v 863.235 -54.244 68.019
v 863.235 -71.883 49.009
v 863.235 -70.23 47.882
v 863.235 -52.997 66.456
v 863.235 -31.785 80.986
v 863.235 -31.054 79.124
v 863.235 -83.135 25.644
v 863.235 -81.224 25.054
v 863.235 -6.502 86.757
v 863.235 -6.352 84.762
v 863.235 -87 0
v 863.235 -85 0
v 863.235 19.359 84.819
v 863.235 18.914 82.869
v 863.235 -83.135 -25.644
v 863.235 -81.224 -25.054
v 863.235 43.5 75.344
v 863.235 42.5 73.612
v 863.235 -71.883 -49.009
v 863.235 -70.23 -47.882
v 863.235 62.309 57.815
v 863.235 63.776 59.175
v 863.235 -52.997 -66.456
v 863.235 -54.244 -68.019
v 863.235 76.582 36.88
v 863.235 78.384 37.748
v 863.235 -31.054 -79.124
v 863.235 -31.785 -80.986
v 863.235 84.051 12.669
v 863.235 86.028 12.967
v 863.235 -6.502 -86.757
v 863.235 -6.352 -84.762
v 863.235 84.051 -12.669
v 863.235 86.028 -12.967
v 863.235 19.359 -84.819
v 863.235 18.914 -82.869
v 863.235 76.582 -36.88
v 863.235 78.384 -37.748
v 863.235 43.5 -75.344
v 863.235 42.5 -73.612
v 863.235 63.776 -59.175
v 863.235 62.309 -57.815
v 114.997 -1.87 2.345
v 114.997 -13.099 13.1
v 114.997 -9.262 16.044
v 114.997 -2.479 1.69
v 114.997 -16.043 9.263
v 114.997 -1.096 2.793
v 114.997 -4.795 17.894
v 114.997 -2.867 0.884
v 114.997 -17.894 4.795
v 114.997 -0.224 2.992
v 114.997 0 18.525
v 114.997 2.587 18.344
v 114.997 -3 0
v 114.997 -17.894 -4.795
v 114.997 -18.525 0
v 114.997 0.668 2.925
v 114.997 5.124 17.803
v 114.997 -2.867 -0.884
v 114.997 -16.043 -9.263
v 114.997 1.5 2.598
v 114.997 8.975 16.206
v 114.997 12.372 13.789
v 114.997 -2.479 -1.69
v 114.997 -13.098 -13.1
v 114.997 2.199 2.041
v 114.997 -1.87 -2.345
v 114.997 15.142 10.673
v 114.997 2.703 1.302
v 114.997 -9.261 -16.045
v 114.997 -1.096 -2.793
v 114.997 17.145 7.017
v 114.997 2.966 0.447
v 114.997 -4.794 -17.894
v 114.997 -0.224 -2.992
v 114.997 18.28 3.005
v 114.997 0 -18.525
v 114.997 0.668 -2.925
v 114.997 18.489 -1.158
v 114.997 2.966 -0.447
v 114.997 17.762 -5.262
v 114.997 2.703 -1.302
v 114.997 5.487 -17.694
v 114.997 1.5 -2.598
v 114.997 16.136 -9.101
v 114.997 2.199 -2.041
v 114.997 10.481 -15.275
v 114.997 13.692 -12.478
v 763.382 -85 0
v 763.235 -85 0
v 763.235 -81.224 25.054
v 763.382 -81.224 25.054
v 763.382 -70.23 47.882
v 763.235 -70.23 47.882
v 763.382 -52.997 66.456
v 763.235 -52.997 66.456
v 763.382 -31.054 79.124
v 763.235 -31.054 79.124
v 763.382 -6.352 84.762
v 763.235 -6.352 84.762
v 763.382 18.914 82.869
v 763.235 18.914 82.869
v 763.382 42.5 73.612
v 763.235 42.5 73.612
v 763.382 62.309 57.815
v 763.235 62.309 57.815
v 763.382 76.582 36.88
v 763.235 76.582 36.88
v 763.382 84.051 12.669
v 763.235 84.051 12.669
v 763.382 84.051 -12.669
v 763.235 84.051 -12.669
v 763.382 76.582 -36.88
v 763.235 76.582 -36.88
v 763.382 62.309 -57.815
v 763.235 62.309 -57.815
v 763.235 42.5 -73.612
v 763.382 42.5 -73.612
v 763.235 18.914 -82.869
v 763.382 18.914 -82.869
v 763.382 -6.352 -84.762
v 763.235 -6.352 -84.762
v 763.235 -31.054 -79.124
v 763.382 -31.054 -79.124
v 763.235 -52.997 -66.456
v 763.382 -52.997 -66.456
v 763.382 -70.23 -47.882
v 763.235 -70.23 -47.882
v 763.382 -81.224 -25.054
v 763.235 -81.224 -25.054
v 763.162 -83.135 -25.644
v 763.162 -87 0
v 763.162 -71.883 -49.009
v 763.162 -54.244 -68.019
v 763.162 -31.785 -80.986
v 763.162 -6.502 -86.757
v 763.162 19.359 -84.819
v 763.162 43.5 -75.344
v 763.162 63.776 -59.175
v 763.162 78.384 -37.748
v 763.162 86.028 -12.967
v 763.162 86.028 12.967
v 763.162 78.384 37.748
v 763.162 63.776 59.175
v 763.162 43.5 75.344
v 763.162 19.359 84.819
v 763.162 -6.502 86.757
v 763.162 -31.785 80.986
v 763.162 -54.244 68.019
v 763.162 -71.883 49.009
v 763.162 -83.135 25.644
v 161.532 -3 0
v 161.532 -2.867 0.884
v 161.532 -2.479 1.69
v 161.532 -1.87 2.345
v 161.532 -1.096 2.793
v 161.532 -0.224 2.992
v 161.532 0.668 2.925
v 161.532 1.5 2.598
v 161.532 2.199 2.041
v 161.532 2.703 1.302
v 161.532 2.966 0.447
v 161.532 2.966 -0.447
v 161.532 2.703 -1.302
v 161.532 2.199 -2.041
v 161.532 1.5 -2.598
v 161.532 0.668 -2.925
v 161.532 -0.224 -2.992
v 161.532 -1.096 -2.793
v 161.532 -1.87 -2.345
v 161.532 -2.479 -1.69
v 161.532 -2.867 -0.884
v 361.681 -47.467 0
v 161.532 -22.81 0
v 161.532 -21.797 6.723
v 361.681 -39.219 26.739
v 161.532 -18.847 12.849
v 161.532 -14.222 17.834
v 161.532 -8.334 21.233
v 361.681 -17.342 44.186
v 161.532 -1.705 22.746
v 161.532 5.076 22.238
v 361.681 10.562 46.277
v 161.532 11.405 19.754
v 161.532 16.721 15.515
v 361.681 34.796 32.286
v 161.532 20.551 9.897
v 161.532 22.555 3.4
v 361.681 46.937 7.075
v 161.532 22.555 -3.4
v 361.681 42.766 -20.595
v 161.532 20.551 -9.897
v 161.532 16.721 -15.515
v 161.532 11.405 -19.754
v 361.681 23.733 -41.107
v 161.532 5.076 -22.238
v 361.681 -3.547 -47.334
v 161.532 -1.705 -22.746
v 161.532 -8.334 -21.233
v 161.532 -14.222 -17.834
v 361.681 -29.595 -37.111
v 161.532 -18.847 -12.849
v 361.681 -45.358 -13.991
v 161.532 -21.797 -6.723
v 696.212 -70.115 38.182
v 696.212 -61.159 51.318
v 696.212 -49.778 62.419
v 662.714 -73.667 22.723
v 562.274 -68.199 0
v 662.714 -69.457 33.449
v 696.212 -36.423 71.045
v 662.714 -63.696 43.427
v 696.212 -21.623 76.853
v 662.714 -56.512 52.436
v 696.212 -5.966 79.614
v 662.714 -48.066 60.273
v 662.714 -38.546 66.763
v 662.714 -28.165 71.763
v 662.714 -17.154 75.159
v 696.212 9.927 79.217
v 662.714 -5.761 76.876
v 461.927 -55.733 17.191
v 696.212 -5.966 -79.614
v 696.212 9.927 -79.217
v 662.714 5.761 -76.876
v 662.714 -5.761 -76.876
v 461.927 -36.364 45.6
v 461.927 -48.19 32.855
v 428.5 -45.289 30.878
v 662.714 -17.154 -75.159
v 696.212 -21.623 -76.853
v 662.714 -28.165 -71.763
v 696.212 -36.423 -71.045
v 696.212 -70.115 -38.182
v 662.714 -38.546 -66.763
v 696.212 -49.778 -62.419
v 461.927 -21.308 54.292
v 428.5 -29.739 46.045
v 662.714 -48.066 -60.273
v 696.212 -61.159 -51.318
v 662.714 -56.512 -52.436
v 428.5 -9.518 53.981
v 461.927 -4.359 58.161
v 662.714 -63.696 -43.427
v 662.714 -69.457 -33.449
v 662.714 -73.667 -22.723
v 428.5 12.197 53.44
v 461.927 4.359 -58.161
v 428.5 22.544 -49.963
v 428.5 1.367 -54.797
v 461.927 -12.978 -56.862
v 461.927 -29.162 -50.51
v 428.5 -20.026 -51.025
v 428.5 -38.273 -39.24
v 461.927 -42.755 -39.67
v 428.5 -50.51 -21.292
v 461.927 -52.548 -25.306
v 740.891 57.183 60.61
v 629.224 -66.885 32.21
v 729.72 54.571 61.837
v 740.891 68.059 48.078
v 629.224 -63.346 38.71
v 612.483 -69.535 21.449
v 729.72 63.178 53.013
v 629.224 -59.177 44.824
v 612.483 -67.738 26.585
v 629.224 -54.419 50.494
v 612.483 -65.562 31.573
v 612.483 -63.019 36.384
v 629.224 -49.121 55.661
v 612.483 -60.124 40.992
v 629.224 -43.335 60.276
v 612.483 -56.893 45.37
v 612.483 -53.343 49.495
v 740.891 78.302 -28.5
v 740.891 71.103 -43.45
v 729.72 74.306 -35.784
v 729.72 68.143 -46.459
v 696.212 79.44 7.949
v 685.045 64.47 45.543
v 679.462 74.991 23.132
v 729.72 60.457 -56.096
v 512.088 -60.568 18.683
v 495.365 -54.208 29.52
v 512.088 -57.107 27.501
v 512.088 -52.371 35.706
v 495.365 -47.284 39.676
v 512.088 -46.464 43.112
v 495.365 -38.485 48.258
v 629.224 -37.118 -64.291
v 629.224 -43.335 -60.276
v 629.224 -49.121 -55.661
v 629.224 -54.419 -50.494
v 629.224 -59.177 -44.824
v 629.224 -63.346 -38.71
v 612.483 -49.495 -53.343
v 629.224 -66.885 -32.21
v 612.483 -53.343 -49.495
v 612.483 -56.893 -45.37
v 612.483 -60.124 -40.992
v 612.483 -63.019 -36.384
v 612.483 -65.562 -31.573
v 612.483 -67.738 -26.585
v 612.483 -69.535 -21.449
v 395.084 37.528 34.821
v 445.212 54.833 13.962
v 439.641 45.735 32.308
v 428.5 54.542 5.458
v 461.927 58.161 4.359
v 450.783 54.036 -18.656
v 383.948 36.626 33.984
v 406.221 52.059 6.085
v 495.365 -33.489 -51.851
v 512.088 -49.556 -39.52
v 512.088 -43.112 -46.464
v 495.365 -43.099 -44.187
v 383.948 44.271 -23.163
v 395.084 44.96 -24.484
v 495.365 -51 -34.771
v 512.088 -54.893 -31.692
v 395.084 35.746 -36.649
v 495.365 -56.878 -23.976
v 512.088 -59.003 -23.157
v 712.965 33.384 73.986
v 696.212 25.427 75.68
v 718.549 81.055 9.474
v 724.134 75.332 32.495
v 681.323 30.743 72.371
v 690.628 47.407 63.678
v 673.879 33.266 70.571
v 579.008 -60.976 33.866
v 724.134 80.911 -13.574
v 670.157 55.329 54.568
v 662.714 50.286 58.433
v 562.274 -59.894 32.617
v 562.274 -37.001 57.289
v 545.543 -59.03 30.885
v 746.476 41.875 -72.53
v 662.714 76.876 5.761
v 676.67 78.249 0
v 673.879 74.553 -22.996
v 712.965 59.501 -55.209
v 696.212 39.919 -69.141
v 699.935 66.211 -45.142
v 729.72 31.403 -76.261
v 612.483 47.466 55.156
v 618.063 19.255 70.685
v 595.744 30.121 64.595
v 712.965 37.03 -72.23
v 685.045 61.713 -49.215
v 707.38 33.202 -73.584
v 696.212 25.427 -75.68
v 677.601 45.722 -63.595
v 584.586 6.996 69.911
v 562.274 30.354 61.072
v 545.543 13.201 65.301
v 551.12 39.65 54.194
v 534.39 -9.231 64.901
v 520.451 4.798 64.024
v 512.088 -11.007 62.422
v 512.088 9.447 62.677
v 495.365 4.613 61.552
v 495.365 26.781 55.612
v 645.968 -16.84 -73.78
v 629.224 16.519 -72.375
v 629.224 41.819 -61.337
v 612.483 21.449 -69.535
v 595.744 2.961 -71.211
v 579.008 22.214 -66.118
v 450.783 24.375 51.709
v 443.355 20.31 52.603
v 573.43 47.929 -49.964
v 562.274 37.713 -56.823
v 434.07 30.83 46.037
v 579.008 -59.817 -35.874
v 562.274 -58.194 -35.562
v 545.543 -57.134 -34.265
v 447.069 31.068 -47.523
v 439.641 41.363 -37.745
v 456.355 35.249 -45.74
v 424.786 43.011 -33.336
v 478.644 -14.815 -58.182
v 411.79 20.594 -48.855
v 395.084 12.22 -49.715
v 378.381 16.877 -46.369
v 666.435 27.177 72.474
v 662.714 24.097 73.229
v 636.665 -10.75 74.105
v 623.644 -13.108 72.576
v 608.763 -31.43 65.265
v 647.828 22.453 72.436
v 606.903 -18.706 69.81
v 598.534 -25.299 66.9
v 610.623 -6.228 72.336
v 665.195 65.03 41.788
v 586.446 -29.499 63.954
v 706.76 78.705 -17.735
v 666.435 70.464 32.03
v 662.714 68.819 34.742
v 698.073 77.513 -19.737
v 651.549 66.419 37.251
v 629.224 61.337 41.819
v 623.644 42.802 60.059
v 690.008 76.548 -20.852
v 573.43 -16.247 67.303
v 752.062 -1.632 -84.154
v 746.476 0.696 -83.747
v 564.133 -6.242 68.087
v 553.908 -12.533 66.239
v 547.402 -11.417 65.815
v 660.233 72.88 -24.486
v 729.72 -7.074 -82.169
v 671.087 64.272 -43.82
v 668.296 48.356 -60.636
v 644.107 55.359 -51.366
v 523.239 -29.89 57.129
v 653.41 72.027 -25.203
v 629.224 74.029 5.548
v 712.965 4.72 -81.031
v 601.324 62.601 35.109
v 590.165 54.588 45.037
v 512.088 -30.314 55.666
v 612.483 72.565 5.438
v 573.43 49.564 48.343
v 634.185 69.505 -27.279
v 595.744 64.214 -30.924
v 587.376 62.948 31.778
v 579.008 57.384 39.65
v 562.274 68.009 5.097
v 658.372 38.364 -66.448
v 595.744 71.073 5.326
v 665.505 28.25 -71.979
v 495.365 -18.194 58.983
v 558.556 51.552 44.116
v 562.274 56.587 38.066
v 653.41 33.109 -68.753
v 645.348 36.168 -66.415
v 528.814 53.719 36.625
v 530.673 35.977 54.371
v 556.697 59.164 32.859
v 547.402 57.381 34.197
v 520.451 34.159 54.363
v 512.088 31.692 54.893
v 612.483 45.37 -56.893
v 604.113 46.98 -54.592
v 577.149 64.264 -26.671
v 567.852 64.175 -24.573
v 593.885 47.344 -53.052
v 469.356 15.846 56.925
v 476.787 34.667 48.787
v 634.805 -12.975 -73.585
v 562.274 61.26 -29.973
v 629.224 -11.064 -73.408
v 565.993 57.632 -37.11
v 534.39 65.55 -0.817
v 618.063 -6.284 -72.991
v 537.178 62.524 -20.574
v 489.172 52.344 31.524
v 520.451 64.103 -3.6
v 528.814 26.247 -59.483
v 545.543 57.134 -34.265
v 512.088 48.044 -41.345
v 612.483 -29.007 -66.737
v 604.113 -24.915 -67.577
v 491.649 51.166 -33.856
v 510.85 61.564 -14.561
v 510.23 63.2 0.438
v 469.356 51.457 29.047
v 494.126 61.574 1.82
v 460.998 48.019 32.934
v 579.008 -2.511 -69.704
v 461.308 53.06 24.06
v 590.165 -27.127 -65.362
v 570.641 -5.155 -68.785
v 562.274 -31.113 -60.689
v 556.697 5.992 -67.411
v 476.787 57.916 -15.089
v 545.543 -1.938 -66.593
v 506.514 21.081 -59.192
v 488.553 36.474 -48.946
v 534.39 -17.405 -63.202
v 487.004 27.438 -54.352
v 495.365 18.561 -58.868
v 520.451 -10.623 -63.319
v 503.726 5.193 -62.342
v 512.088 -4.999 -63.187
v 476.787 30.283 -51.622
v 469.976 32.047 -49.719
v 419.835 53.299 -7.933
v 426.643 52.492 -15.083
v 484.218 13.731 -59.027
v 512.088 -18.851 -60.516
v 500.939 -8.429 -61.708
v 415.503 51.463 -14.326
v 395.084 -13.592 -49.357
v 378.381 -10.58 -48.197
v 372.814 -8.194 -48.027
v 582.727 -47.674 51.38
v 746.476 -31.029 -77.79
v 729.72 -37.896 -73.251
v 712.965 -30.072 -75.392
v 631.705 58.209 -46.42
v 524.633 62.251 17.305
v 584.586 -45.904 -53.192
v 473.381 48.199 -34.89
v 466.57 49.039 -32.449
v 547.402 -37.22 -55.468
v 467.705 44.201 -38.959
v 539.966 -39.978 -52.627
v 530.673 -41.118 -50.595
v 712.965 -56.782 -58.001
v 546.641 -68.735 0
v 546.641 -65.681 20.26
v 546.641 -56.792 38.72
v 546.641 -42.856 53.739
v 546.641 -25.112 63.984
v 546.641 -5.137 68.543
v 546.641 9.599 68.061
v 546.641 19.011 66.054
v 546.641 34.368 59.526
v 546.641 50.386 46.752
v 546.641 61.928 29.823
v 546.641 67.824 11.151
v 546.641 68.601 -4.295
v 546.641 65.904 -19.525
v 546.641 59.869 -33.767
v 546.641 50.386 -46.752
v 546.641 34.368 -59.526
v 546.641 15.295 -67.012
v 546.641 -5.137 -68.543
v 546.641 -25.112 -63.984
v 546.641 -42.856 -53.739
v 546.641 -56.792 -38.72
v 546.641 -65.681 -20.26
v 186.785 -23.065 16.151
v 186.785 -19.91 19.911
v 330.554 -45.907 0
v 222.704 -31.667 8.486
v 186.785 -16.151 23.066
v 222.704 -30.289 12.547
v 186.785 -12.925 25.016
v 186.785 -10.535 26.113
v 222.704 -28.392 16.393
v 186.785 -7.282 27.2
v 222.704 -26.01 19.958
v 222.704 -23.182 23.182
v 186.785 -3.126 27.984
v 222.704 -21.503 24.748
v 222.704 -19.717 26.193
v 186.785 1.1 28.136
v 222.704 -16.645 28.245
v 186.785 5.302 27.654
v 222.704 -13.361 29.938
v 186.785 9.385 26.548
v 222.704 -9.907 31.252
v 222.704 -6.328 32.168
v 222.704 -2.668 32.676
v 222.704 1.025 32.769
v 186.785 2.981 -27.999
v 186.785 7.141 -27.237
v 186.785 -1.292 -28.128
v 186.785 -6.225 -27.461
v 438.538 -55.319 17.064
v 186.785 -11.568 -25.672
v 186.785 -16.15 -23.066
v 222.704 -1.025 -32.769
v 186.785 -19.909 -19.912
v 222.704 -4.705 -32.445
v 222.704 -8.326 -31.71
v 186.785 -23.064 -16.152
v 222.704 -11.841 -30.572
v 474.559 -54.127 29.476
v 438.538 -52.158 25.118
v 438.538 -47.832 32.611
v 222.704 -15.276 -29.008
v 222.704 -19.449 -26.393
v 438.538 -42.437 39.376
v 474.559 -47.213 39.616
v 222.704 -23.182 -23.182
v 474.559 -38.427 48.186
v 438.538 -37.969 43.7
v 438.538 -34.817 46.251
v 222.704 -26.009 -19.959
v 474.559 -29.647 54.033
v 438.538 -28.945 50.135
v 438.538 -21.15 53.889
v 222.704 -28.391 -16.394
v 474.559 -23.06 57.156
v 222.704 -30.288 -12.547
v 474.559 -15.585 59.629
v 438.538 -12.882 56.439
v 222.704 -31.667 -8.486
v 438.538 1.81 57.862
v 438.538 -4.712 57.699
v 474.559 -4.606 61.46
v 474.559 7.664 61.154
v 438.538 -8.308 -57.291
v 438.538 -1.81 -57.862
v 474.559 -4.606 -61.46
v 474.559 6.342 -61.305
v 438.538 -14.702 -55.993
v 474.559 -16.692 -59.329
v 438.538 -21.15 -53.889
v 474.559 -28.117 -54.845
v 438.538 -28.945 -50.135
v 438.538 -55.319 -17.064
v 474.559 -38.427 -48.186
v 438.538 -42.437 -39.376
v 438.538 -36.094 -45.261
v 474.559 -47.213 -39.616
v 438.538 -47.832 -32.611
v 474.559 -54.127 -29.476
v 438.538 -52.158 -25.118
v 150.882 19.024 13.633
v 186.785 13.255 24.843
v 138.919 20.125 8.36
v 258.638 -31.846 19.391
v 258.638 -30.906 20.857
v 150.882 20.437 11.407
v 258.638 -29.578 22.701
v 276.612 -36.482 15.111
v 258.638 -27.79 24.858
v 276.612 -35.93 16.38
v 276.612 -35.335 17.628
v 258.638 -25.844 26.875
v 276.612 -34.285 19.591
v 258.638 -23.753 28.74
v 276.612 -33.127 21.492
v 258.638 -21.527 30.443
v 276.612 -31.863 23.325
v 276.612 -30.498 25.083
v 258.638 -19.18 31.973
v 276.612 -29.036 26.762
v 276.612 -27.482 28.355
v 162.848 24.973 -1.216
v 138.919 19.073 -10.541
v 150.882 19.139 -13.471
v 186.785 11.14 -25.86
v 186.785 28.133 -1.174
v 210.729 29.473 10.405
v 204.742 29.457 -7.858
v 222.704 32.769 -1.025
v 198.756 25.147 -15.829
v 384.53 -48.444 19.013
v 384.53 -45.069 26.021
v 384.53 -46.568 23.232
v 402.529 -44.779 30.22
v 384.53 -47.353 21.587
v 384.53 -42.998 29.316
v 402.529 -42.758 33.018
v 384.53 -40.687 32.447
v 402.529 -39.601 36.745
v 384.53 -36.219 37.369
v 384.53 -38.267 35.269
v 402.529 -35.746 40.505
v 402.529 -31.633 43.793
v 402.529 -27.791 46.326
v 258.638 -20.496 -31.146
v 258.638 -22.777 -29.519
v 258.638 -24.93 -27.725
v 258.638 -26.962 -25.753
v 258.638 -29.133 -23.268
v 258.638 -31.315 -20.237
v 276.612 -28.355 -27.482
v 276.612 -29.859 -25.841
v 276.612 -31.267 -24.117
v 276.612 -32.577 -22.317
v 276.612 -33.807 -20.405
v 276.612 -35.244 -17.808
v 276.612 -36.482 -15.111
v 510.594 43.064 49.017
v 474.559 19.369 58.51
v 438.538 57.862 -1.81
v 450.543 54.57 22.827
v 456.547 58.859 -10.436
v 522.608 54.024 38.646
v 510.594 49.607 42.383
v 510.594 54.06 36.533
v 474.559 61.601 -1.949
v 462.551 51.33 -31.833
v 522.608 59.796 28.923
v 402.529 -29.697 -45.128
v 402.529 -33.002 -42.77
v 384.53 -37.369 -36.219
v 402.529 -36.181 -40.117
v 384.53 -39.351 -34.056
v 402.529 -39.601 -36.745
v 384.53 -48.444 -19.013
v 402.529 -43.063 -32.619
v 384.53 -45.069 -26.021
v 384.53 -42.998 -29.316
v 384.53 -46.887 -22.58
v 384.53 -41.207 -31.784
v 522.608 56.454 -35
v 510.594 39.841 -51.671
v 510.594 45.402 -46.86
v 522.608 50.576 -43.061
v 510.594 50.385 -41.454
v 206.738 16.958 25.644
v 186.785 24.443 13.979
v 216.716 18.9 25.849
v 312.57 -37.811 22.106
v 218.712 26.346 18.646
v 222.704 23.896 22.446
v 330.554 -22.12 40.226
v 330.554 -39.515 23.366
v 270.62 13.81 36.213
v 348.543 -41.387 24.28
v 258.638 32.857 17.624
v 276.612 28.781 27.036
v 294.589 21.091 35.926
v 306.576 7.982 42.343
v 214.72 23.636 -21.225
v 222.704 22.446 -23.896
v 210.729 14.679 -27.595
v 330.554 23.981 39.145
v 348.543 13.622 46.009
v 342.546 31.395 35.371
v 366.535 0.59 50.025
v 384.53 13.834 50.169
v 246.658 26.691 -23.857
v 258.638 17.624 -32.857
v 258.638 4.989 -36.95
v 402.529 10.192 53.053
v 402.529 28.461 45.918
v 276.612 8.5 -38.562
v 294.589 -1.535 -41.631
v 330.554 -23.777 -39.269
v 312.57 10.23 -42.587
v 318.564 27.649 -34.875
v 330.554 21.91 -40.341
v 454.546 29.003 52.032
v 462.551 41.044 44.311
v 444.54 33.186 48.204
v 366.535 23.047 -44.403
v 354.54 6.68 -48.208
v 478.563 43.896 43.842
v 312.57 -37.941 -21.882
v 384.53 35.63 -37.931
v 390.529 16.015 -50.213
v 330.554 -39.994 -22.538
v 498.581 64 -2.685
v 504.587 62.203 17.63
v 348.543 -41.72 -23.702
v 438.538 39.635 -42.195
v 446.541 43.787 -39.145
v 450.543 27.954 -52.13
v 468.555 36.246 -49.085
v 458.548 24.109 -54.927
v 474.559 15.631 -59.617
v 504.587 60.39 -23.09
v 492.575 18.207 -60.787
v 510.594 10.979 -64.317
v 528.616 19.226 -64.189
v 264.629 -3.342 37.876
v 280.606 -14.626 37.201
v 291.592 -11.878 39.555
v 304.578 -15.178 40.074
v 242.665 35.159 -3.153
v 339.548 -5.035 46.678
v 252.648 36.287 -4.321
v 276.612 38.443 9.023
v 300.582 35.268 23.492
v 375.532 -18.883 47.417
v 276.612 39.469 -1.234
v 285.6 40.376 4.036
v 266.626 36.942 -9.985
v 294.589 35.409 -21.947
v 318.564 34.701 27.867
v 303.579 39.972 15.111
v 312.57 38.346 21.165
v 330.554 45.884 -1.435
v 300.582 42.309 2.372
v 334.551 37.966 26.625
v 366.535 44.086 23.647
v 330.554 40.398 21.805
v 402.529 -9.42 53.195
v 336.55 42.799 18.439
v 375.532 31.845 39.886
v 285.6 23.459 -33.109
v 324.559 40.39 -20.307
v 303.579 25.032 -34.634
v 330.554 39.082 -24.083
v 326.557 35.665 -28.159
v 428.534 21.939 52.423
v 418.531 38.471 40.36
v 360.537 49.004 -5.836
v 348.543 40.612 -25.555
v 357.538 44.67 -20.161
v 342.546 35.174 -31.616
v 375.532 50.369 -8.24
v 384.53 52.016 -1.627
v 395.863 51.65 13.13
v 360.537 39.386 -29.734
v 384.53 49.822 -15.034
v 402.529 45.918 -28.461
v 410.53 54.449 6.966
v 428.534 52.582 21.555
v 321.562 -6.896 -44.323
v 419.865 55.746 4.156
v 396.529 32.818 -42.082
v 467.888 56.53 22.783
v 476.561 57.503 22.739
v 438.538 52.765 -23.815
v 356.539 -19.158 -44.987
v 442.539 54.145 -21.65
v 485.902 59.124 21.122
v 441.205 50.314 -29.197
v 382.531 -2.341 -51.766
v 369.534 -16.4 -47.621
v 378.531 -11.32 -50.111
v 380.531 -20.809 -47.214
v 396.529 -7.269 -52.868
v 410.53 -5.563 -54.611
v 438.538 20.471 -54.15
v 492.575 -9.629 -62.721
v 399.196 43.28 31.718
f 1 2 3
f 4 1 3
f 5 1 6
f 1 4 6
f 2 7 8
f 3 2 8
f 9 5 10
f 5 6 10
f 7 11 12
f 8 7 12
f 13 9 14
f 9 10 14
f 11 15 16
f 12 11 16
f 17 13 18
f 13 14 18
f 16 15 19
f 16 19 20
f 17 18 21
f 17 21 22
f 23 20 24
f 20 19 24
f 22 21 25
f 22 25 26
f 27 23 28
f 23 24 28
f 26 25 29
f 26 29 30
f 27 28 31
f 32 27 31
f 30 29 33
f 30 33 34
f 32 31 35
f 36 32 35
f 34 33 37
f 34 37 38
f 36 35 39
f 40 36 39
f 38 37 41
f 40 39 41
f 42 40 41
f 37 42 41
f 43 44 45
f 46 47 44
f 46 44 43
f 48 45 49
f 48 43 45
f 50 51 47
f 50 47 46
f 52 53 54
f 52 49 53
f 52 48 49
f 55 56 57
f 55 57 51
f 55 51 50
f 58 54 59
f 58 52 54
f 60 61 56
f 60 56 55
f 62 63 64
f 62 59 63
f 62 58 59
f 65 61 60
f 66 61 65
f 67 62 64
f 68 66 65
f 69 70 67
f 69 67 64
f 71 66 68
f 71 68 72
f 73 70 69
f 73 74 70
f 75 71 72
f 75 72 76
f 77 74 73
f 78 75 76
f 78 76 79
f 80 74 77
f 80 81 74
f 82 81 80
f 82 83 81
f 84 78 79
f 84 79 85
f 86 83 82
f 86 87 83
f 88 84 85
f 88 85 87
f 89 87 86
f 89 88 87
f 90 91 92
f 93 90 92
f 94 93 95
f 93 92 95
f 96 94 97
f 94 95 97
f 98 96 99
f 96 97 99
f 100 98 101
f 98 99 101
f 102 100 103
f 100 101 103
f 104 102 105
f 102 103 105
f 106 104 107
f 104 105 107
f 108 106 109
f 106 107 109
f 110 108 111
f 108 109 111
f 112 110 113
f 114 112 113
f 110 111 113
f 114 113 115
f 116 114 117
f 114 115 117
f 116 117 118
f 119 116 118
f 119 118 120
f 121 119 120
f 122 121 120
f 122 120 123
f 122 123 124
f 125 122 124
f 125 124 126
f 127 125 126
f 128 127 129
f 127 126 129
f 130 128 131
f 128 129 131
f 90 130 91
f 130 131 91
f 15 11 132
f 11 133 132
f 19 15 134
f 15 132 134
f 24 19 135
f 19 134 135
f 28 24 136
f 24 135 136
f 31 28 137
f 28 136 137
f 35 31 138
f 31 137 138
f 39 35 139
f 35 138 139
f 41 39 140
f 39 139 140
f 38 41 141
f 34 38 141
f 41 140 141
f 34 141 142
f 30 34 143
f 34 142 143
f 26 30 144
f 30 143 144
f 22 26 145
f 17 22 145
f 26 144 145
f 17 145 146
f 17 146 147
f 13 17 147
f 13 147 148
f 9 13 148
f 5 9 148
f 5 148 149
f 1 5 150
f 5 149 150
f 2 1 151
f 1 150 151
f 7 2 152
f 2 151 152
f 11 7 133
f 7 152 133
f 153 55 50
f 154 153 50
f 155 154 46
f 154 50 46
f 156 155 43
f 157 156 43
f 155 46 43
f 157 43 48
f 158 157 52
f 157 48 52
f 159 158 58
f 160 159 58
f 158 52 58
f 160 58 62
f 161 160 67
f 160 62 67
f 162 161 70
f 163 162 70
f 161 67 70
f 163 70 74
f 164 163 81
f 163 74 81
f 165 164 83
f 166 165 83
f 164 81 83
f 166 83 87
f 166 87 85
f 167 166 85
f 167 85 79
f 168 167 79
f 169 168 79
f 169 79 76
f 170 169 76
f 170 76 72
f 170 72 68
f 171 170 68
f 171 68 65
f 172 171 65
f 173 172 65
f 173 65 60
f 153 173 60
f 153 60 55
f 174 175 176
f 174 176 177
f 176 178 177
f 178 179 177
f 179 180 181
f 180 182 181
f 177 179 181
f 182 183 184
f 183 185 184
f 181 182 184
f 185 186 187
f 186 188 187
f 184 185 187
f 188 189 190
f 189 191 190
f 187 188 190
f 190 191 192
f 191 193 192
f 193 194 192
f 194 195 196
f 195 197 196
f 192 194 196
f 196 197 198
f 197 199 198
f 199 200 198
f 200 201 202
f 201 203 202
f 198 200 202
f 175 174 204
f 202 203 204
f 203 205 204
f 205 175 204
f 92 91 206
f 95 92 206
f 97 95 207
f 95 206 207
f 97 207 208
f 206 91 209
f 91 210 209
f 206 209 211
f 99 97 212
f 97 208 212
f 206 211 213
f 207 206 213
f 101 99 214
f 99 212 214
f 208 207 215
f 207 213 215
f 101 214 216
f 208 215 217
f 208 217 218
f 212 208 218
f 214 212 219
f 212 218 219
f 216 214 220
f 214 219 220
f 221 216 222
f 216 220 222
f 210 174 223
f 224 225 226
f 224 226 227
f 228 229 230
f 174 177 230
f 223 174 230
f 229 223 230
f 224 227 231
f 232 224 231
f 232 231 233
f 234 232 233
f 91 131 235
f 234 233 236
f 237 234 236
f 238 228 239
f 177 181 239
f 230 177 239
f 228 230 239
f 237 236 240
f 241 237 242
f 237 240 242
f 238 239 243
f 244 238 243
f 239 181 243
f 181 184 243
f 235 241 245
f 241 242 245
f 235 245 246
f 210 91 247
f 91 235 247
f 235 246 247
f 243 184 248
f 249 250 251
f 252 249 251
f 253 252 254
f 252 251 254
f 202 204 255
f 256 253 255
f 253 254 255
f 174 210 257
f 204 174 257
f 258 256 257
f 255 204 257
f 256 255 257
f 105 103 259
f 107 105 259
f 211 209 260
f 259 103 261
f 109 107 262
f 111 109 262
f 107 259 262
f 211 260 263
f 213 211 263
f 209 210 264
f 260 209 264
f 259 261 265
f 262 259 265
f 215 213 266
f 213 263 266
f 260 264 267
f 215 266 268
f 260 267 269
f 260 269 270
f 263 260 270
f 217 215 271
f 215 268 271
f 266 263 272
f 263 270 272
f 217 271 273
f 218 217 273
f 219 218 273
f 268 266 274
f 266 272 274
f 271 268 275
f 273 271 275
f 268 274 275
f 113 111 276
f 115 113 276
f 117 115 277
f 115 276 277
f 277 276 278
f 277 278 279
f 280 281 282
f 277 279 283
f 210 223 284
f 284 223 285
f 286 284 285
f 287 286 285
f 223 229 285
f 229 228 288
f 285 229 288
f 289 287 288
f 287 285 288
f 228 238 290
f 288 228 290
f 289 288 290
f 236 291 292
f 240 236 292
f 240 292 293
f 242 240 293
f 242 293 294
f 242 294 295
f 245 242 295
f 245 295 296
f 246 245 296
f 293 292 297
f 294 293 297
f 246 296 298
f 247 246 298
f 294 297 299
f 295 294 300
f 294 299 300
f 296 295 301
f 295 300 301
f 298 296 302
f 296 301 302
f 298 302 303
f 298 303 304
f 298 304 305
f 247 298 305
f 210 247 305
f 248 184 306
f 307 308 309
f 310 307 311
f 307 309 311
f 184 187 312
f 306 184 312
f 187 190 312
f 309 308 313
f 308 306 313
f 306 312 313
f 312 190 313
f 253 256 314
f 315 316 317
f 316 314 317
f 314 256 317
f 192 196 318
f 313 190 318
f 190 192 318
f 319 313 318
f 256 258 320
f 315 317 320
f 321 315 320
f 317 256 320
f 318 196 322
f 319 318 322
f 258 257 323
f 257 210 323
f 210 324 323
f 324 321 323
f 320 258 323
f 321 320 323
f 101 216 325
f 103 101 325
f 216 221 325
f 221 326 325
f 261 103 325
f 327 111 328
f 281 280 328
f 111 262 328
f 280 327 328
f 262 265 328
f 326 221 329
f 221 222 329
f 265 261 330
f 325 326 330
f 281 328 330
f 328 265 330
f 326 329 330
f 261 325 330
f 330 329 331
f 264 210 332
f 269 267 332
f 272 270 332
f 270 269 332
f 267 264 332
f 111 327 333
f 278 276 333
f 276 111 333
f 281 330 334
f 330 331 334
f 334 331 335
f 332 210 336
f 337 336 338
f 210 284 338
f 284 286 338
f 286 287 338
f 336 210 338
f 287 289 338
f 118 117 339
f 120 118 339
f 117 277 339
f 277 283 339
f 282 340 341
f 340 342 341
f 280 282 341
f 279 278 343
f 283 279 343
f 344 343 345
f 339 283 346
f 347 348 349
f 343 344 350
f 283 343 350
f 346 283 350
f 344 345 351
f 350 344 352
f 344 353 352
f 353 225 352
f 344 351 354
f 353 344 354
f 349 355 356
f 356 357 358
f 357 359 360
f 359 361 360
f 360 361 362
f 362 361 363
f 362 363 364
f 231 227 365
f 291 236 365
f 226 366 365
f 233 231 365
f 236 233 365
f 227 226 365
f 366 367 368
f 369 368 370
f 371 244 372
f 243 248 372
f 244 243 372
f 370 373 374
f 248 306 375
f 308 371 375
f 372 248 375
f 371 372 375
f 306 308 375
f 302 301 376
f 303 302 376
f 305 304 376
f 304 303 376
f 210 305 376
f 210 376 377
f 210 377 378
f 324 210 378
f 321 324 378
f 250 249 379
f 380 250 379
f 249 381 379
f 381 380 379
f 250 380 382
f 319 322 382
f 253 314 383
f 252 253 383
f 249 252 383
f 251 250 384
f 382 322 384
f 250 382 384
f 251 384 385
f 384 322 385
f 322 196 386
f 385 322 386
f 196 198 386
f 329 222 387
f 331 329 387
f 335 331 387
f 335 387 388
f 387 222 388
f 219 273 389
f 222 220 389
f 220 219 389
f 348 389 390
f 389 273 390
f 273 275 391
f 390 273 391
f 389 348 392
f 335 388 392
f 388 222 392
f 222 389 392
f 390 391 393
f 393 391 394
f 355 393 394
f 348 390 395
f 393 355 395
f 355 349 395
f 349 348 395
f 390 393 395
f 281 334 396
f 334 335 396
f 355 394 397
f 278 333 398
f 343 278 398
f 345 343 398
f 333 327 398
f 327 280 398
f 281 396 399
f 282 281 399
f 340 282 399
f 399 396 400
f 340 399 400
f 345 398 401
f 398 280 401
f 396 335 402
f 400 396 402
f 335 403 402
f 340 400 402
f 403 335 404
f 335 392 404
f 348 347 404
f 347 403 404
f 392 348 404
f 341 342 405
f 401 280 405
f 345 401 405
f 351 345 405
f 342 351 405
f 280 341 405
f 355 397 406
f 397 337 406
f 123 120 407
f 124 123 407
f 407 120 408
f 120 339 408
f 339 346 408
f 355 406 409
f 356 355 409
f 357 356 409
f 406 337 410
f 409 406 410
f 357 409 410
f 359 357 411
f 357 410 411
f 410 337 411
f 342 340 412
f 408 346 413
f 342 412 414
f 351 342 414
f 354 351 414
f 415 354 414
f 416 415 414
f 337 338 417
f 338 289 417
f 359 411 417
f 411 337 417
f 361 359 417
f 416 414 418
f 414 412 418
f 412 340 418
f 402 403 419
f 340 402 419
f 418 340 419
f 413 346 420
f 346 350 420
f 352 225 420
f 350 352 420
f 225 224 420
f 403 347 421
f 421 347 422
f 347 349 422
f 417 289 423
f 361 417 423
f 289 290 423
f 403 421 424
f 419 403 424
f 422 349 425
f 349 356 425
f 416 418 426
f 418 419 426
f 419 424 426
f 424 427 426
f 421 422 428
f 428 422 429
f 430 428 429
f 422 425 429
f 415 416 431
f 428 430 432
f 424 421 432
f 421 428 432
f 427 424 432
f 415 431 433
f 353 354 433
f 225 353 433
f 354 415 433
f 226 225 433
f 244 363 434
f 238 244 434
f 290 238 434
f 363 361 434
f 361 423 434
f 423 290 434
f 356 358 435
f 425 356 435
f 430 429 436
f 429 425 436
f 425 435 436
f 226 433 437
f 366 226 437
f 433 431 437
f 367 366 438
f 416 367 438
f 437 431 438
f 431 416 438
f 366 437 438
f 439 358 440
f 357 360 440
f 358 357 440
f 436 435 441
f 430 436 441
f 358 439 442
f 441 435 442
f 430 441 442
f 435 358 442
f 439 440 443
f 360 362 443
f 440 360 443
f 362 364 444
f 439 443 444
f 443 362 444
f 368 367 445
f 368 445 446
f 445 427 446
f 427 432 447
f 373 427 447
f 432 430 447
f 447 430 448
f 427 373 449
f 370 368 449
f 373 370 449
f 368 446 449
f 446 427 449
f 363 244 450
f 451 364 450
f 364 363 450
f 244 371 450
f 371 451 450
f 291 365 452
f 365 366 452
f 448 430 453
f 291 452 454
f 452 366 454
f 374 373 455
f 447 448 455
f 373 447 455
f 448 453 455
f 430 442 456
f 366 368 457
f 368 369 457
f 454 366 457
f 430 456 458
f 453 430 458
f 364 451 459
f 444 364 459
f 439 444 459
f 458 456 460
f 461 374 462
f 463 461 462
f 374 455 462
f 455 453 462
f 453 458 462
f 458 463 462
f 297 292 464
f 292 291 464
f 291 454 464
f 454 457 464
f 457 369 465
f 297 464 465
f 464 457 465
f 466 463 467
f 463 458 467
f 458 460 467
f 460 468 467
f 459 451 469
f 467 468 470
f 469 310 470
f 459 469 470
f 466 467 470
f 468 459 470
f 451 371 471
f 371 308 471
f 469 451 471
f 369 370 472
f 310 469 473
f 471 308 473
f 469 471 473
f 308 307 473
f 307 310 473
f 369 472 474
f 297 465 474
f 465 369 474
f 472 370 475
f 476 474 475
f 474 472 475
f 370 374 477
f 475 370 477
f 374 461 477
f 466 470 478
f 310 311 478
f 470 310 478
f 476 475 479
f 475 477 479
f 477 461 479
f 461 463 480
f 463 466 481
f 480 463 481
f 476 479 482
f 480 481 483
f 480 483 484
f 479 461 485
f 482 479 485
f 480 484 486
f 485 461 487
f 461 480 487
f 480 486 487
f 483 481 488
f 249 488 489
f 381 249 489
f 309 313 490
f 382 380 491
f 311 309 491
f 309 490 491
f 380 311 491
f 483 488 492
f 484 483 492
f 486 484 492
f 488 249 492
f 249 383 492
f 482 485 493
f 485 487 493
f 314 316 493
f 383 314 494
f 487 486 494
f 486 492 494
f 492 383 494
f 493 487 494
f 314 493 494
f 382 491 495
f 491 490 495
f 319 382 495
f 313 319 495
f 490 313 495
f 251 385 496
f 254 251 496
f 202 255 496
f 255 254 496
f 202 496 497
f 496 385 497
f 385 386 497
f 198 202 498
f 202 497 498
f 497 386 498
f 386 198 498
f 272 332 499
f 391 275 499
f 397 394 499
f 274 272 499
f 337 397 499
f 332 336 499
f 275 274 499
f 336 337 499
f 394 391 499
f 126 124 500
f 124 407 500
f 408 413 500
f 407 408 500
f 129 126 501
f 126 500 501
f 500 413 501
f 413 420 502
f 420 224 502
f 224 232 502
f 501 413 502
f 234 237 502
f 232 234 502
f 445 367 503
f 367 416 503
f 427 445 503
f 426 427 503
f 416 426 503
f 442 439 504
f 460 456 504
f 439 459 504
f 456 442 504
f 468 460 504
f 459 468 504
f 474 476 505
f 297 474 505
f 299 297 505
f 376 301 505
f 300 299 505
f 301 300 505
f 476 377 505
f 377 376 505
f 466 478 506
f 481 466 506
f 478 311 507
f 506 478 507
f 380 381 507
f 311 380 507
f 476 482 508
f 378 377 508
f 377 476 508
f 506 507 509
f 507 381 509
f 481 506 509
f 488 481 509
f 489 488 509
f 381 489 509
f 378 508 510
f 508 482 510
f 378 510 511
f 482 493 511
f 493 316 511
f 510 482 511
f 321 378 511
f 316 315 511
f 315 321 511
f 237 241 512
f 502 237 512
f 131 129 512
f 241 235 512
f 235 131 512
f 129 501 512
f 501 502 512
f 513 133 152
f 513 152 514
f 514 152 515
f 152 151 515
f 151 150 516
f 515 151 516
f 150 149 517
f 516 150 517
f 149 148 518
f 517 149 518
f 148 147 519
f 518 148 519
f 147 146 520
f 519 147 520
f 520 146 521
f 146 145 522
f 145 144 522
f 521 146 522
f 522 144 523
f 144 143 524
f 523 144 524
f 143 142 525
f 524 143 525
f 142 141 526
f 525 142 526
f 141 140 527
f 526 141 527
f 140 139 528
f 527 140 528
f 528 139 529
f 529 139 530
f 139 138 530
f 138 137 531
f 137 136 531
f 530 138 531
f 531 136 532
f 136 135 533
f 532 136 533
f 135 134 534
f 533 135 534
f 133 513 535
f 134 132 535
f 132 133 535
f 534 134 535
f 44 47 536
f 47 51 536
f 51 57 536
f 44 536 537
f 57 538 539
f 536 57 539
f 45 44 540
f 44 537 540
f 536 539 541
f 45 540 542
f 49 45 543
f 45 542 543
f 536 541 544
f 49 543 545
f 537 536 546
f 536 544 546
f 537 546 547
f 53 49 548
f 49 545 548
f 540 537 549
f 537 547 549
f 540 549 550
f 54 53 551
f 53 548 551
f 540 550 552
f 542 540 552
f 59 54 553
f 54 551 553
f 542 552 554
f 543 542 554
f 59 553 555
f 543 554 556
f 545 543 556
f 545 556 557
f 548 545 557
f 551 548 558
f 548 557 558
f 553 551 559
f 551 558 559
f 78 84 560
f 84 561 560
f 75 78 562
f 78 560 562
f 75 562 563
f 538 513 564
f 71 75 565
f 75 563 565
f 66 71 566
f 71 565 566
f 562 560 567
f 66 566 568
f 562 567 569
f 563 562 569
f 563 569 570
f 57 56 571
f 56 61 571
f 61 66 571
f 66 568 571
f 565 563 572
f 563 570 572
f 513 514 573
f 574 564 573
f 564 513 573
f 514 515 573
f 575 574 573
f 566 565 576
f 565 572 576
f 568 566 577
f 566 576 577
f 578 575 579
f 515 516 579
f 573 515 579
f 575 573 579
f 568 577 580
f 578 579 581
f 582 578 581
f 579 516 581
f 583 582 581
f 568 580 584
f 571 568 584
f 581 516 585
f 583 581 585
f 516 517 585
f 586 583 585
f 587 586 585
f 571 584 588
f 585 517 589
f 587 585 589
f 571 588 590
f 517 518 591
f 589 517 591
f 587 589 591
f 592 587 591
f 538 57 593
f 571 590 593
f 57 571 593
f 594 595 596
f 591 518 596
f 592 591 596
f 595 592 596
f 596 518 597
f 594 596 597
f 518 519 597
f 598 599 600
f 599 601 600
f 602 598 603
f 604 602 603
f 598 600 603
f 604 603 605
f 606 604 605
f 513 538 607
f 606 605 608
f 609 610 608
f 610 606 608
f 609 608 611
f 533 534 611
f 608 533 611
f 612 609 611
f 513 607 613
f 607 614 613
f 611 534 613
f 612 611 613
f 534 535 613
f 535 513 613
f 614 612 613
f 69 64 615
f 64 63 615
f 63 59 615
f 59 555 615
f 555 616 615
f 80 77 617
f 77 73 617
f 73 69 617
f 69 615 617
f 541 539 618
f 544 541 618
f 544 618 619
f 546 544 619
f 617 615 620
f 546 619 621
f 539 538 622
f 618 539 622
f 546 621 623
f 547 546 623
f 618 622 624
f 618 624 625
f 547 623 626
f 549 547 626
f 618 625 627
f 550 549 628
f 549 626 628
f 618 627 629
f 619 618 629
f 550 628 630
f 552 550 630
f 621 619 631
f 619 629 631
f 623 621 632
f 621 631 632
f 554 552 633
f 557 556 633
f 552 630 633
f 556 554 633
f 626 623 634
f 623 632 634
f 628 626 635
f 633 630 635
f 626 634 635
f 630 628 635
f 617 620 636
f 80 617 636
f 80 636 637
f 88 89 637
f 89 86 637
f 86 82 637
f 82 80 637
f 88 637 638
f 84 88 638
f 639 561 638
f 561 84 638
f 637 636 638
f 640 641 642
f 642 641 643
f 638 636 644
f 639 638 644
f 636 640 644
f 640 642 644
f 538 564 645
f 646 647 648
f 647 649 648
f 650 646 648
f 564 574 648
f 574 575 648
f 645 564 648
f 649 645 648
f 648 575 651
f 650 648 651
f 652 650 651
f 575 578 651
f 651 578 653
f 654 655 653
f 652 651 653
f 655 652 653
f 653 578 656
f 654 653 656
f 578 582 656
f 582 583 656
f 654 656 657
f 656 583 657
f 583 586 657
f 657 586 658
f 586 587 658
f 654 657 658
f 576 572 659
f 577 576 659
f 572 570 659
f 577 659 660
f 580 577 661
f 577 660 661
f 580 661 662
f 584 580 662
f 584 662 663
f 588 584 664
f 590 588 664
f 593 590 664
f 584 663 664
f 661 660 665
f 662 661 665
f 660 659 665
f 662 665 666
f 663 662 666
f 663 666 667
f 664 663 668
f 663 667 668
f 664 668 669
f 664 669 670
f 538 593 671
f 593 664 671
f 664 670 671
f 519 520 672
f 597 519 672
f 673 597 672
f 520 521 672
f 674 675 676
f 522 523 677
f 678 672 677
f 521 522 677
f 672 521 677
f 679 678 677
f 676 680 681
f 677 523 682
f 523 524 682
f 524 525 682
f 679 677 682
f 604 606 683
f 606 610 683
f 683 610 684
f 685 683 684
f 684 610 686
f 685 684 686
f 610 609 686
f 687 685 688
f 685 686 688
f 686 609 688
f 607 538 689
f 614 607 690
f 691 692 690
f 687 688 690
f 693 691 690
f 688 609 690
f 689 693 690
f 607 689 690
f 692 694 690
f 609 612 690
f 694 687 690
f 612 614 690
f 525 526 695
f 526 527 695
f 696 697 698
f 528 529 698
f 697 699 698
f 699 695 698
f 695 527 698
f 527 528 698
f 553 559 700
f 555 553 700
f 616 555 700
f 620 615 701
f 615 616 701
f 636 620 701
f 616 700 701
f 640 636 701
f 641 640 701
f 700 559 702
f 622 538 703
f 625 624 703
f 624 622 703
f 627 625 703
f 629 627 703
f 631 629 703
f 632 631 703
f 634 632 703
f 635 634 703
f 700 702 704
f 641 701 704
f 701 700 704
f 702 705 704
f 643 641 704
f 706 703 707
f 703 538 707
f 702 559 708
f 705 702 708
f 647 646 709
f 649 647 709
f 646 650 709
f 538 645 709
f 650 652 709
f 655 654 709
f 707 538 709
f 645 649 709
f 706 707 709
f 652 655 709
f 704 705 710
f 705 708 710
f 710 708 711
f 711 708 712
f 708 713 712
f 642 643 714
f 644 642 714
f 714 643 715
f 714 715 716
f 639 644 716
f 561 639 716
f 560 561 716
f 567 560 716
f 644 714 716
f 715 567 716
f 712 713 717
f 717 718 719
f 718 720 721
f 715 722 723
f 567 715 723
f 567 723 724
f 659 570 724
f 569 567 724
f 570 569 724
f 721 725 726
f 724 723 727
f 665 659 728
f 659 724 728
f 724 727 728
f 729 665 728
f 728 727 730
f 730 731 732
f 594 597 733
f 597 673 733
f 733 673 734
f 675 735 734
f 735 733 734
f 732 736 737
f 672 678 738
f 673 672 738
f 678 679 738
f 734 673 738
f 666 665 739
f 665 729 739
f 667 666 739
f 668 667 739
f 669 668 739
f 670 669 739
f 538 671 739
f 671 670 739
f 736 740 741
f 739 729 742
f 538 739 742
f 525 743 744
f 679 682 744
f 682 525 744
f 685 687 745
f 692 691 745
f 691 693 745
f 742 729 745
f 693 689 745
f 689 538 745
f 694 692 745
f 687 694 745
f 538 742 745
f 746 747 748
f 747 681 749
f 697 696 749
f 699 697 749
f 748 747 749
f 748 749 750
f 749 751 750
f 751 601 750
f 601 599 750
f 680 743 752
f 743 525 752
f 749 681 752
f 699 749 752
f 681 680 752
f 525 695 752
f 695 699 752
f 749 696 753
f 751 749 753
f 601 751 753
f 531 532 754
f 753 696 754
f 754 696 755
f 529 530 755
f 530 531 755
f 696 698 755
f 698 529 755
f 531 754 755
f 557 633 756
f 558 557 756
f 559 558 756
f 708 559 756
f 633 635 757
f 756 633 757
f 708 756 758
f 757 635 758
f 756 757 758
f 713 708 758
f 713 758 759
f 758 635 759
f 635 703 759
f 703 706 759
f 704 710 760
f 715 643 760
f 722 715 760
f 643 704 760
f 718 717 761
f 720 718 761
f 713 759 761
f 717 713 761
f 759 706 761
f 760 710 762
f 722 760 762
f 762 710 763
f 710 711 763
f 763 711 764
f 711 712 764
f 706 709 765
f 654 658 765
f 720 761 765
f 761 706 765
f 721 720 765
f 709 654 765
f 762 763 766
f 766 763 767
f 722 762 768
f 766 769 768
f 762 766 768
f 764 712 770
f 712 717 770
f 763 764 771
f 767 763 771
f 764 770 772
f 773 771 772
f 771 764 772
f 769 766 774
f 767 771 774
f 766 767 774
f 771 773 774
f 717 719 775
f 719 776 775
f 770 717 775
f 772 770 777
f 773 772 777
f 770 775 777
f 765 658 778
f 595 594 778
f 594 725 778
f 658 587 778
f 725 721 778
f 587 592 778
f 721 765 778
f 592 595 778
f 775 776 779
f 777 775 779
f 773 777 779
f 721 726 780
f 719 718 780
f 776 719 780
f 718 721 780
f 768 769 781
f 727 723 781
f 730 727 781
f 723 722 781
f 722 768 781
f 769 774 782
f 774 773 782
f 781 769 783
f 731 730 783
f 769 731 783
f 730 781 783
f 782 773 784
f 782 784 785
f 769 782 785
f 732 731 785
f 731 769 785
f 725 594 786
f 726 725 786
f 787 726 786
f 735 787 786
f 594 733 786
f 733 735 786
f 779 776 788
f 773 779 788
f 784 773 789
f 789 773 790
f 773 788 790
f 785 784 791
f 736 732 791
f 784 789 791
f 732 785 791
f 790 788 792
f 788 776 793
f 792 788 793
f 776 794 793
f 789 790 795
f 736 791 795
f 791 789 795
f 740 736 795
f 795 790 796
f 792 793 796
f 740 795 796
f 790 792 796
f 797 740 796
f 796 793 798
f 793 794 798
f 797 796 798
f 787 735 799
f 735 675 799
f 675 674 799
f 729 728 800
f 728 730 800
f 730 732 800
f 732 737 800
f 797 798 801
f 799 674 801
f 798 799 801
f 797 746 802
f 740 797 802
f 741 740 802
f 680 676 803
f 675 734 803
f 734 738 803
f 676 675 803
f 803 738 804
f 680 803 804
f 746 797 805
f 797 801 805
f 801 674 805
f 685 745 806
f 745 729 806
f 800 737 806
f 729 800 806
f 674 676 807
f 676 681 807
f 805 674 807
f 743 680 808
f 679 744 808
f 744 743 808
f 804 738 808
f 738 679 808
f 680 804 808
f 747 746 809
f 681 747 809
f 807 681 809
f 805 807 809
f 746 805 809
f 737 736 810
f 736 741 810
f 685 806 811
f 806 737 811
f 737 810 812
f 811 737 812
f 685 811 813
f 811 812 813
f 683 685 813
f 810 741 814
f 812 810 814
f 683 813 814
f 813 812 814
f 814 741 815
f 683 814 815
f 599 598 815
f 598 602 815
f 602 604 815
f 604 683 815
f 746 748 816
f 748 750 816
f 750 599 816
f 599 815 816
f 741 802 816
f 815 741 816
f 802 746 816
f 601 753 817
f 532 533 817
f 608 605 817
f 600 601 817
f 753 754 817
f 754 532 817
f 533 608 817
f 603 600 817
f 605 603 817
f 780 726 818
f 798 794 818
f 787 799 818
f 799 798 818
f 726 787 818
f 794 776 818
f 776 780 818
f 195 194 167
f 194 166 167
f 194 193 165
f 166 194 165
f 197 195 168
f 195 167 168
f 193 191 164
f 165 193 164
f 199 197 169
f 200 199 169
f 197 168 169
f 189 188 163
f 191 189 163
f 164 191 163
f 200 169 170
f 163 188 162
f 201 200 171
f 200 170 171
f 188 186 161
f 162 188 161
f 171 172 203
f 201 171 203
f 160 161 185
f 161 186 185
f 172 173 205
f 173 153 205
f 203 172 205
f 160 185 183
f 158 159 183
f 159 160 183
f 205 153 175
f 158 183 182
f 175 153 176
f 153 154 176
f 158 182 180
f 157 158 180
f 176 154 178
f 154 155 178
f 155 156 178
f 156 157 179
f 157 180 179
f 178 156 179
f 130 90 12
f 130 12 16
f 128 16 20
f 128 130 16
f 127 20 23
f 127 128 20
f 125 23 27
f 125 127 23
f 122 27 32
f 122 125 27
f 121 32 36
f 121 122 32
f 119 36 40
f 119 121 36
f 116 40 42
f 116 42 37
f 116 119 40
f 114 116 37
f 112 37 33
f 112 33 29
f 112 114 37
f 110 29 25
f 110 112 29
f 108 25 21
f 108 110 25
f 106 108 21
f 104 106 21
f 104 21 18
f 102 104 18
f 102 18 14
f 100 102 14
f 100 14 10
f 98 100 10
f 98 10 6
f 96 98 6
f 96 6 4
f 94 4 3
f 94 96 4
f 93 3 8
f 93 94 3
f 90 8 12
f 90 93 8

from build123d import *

# Parameters (mm, degrees)
SKETCH14_W         = 99.852899645
SKETCH14_H         = 2
CUT_EXTRUDE1_DEPTH = 50
CUT_EXTRUDE2_REACH = 760.286
SKETCH21_R         = 3


with BuildPart() as part:
    # Sketch1 → Revolve1 (revolve)
    with BuildSketch(Plane(origin=(0, 0, 0), x_dir=(-1, 0, 0), z_dir=(0, 0, -1)), mode=Mode.PRIVATE) as revolve1_sk:
        with BuildLine():
            Line((-763.382394472, 85), (-763.235294117, 85))
            ThreePointArc((-763.235294117, 85), (-461.926690188, 58.32401398), (-161.53152562, 22.810240092))
            Line((-161.53152562, 22.810240092), (-161.53152562, 0))
            Line((-161.53152562, 0), (18.46847438, 0))
            Line((18.46847438, 0), (0.295326728, 1.978075358))
            ThreePointArc((0.295326728, 1.978075358), (-380.640283603, 51.608700281), (-763.161647781, 87))
            Line((-763.161647781, 87), (-763.382394472, 87))
            Line((-763.382394472, 87), (-763.382394472, 85))
        make_face()
    revolve(revolve1_sk.sketch.rotate(Axis((763.235294117, 0, 0), (-1, 0, 0)), 180), axis=Axis((763.235294117, 0, 0), (-1, 0, 0)))

    # Sketch14 → Revolve4 (revolve)
    with BuildSketch(Plane(origin=(0, 0, 0), x_dir=(-1, 0, 0), z_dir=(0, 0, -1)), mode=Mode.PRIVATE) as revolve4_sk:
        with Locations((-813.308844295, 86)):
            Rectangle(SKETCH14_W, SKETCH14_H)
    revolve(revolve4_sk.sketch.rotate(Axis((763.235294117, 0, 0), (1, 0, 0)), 180), axis=Axis((763.235294117, 0, 0), (1, 0, 0)))

    # Sketch15 → Cut-Extrude1 (cut, symmetric)
    with BuildSketch(Plane.XY):
        Polygon((-1798.394426372, -1.080422086), (-17.779665104, -0.07497417), (114.997091286, 0), (114.997091286, 42.308767364), (-24.793740749, 42.308767364), (-24.793740749, -36.098631976), (114.997091286, -36.098631976), (114.997091286, 0), (114.997091286, 1780.615045137), (-2311.882223875, 4386.879909942), (-4225.273741533, 2605.184442719), align=None)
    extrude(amount=CUT_EXTRUDE1_DEPTH, both=True, mode=Mode.SUBTRACT)


with BuildPart() as cut_extrude1_kept_piece:
    # of the separate pieces the step leaves, the one the design keeps (cut_extrude1_pieces_kept)
    add(part.part.solids().sort_by_distance((763.161647781, -87, 0))[0])

    # Sketch21 → Cut-Extrude2 (cut, up to next)
    with BuildSketch(Plane.ZY.offset(-114.997091286), mode=Mode.PRIVATE) as cut_extrude2_sk1:
        with Locations(Location((0, 0, 0), (0, 0, 270))):
            Circle(SKETCH21_R)
    cut_extrude2_tool1 = extrude(cut_extrude2_sk1.sketch, amount=-CUT_EXTRUDE2_REACH, mode=Mode.PRIVATE) & cut_extrude1_kept_piece.part
    add(cut_extrude2_tool1.solids().sort_by_distance((114.997091, 0, 0))[0], mode=Mode.SUBTRACT)


solid = cut_extrude1_kept_piece.part
